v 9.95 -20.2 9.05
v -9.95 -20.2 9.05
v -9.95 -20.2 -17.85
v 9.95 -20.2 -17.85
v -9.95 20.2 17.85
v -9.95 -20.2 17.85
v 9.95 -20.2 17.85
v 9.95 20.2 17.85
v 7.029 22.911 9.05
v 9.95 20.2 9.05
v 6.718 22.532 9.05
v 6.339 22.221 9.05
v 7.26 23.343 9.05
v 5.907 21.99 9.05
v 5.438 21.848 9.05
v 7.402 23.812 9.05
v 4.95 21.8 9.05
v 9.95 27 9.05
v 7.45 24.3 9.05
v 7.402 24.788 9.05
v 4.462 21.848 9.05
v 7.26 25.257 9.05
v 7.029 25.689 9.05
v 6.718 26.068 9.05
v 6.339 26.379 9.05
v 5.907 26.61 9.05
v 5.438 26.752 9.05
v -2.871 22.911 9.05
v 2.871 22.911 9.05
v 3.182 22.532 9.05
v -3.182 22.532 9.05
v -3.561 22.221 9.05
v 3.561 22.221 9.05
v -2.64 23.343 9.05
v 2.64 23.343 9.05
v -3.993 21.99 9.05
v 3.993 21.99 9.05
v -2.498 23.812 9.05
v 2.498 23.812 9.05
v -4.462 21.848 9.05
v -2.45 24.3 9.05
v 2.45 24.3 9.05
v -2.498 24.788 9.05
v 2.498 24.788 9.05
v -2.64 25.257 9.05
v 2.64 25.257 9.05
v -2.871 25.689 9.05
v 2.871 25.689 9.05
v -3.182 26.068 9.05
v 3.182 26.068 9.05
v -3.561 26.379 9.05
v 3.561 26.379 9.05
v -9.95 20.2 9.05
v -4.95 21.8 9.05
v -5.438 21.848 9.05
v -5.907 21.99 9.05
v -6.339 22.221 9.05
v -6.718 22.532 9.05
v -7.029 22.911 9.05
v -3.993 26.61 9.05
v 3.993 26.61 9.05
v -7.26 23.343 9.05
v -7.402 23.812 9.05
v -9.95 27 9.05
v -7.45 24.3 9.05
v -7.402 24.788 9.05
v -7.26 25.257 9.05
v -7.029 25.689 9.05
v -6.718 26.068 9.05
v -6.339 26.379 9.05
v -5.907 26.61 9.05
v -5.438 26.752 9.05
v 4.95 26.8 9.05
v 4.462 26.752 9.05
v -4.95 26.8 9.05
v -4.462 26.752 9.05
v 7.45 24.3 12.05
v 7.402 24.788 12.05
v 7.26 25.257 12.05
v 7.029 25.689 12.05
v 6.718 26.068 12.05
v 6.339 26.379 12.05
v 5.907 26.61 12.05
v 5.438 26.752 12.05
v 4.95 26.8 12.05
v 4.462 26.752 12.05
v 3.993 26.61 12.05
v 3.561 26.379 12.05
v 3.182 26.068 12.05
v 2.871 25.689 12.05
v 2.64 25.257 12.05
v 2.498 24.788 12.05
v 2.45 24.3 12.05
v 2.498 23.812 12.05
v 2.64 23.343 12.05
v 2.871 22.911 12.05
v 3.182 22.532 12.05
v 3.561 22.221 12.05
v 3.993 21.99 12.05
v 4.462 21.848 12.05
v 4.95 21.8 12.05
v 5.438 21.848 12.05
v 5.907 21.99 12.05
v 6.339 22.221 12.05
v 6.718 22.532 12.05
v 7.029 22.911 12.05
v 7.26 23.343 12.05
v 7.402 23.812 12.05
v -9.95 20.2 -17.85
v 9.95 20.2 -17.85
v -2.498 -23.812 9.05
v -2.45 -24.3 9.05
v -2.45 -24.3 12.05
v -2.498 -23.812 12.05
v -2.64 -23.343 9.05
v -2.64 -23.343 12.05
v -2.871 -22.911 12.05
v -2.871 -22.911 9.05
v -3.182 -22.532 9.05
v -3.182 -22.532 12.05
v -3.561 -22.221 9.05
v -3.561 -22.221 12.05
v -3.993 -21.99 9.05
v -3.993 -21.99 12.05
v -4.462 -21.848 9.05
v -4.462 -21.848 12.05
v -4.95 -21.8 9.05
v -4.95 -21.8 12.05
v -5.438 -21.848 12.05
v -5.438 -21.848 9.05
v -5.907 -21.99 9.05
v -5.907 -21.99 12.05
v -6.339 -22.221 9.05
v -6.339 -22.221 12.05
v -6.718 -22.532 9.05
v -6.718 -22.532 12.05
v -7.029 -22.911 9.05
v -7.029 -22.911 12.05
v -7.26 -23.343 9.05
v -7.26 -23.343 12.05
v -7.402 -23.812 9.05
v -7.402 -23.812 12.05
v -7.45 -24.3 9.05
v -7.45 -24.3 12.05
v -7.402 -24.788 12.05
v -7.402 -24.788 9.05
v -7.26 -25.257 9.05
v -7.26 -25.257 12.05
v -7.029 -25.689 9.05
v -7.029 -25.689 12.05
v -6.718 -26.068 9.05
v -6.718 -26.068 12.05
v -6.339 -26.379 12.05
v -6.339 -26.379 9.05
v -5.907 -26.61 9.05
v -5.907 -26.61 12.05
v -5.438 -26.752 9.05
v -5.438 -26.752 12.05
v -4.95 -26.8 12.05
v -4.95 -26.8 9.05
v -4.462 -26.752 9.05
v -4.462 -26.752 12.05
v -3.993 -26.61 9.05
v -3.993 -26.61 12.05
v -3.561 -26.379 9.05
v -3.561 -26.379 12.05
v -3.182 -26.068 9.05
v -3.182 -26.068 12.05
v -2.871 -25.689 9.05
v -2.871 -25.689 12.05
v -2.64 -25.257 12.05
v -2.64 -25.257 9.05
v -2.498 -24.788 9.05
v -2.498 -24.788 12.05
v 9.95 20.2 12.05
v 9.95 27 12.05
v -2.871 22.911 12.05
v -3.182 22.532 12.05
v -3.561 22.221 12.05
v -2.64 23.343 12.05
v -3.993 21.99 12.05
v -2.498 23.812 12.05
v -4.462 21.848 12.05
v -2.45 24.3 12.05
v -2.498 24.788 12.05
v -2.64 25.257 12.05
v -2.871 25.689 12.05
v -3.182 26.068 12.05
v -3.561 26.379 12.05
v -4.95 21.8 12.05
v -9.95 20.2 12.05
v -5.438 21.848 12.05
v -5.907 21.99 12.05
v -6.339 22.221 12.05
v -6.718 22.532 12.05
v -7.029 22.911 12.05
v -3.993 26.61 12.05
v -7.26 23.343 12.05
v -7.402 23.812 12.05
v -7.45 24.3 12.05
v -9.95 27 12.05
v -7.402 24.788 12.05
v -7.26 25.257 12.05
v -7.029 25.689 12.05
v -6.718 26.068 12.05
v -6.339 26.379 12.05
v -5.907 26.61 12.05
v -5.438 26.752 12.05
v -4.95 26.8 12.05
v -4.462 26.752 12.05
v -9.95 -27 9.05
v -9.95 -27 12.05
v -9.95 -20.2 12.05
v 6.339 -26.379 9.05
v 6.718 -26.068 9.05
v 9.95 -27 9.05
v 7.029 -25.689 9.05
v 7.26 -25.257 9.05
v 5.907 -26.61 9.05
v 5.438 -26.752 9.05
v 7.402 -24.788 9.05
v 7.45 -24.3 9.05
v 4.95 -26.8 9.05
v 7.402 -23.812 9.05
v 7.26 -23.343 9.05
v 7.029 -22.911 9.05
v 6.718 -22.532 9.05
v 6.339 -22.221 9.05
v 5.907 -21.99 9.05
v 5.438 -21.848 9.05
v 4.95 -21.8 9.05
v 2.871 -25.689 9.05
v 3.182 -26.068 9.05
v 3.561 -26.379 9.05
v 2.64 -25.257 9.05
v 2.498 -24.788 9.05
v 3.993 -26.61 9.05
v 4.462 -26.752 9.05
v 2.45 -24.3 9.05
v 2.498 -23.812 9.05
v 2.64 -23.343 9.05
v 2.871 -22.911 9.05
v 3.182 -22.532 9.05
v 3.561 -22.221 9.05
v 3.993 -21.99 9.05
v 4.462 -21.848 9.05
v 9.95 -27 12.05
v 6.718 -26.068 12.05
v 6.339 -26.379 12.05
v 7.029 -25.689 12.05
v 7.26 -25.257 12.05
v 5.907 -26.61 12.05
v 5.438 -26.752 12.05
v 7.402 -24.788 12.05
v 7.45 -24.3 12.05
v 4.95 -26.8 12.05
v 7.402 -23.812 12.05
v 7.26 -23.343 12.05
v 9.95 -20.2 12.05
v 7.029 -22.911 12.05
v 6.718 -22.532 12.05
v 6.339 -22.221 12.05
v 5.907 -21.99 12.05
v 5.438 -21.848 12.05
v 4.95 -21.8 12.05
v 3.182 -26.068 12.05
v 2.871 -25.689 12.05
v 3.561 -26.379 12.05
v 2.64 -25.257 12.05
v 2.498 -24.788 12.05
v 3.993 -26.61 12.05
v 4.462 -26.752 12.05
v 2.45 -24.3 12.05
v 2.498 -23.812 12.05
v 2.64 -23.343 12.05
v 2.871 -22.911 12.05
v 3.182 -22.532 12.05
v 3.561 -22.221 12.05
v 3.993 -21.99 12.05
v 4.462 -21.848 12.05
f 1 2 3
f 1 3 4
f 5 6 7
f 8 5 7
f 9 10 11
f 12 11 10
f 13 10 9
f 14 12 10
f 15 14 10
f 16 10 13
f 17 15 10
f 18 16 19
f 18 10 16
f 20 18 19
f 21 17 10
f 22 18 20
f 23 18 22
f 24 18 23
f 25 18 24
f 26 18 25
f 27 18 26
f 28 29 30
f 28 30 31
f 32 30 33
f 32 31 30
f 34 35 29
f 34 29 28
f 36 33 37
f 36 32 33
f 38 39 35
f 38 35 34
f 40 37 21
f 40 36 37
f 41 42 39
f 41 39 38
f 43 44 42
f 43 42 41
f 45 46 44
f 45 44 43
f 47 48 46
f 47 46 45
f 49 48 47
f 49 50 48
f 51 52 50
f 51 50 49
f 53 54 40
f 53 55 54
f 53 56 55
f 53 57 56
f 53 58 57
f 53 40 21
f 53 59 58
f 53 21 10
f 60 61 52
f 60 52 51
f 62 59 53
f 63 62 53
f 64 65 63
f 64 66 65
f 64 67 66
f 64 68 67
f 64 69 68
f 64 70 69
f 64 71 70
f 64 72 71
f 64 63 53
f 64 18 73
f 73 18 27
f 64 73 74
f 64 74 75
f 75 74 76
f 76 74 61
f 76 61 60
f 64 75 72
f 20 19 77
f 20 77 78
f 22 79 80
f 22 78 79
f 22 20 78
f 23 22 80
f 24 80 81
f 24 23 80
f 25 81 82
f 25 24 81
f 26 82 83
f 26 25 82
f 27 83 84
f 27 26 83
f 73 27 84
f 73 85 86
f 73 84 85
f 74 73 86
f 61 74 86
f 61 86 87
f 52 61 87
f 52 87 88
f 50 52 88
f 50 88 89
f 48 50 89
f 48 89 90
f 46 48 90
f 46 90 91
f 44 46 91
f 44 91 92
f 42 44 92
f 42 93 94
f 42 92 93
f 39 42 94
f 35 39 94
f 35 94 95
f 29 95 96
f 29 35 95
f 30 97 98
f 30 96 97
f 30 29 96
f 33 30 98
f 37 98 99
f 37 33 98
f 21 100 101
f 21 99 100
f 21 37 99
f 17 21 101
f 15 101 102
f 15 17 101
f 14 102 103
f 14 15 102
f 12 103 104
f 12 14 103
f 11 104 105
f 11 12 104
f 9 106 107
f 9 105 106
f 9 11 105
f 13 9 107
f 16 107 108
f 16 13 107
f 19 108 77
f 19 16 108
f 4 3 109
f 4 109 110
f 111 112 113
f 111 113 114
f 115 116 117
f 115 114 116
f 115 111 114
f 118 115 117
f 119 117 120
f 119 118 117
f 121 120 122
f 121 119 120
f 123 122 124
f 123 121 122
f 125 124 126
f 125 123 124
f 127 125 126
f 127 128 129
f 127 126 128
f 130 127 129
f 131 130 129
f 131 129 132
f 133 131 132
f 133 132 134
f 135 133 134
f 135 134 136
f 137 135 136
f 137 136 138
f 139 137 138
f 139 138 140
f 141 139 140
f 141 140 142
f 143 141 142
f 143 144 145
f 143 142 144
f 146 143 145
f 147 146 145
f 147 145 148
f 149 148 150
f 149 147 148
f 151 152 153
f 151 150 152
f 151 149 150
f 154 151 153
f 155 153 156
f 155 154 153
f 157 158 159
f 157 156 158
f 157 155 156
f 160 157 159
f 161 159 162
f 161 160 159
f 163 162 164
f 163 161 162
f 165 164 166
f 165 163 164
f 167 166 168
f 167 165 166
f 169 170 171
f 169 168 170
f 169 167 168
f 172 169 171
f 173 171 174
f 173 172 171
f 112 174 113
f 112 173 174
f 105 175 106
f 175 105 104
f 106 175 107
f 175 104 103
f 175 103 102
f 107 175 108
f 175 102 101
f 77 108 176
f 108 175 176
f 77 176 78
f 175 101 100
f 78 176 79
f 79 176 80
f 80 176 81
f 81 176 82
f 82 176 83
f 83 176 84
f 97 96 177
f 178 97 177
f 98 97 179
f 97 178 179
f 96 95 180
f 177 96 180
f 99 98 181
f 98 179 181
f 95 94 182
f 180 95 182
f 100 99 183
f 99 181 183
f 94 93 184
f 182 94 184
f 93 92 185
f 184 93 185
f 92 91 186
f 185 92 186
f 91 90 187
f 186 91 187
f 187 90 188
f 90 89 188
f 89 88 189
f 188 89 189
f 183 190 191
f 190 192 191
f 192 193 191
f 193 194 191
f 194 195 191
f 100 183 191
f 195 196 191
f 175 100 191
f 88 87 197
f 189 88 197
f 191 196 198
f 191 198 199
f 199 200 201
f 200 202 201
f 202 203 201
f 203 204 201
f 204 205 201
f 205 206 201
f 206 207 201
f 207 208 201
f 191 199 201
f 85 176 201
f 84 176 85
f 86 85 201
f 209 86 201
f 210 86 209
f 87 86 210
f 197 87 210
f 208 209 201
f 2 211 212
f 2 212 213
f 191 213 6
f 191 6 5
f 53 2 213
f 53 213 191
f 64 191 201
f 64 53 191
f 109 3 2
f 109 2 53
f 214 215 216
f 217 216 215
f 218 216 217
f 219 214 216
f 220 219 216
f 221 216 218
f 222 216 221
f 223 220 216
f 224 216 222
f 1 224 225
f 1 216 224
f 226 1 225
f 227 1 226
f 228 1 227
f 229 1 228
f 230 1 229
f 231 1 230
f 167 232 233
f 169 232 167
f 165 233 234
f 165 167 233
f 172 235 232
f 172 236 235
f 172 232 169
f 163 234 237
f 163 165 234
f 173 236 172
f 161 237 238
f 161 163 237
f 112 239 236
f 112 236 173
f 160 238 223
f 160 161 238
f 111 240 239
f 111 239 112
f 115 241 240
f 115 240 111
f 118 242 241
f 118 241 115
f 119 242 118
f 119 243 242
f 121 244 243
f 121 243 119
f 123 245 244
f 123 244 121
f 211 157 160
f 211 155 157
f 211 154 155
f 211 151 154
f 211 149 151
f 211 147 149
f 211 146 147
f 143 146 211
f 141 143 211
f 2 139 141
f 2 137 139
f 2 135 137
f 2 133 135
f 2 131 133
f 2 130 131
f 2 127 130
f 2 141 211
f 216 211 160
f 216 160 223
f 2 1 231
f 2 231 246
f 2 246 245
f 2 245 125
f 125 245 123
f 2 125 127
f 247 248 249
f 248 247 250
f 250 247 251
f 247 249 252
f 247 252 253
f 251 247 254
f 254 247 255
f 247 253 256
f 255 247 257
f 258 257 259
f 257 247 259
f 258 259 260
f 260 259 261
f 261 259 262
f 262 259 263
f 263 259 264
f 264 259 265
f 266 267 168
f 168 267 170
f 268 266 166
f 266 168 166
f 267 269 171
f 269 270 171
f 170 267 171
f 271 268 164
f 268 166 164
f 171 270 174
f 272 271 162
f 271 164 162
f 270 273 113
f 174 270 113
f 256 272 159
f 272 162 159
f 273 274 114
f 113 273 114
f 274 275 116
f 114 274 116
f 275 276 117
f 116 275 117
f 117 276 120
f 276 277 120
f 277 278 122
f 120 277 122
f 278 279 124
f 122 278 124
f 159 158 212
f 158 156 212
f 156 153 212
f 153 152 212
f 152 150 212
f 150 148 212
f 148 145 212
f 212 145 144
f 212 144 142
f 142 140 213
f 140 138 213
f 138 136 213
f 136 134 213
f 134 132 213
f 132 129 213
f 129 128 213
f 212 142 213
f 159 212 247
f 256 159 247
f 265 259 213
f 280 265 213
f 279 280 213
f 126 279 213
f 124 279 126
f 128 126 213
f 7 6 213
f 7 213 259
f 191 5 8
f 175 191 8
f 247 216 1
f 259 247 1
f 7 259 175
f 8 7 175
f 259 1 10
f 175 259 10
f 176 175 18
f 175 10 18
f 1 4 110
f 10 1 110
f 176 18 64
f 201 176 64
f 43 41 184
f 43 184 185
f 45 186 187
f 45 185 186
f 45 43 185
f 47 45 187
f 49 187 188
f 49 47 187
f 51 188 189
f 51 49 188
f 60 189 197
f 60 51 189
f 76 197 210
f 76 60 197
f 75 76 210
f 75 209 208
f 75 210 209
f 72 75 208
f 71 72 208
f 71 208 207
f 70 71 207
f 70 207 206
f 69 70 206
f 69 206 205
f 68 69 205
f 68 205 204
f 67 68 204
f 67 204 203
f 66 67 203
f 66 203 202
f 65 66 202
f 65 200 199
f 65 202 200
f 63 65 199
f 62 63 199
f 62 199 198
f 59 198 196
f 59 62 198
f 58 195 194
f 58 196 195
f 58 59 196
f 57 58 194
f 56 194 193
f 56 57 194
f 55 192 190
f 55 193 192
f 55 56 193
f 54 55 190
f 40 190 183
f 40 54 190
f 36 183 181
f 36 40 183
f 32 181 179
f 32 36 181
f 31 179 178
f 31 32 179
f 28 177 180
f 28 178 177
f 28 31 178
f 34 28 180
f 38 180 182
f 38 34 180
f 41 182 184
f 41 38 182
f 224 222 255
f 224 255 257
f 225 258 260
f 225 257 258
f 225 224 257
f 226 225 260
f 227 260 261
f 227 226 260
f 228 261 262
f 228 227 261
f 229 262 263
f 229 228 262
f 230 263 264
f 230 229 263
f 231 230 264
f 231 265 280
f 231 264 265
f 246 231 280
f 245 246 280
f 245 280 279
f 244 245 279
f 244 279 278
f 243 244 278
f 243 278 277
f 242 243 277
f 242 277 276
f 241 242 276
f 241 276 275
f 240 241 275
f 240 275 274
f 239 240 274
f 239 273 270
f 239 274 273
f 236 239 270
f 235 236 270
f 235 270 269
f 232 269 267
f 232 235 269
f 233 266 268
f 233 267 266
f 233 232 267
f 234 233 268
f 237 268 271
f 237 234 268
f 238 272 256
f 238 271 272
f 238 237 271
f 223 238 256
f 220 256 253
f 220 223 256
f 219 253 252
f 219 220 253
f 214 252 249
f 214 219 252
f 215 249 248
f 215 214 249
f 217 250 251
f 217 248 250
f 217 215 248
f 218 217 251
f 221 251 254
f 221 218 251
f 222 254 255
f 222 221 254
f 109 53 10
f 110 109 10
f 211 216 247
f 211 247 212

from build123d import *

# Parameters (mm, degrees)
SKETCH4_W               = 19.9
SKETCH4_H               = 40.4
BOSS_EXTRUDE3_DEPTH     = 17.85
SKETCH6_W               = 19.9
SKETCH6_H               = 54
BOSS_EXTRUDE4_DEPTH     = 3
CUT_EXTRUDE2_DEPTH      = 34.861851692
CUT_EXTRUDE2_DEPTH_BACK = 34.861851692
SKETCH1_R               = 2.5


with BuildPart() as part:
    # Sketch4 → Boss-Extrude3 (new, symmetric)
    with BuildSketch(Plane.XY):
        Rectangle(SKETCH4_W, SKETCH4_H)
    extrude(amount=BOSS_EXTRUDE3_DEPTH, both=True)

    # Sketch6 → Boss-Extrude4 (add)
    with BuildSketch(Plane(origin=(0, 0, 9.05), x_dir=(-1, 0, 0), z_dir=(0, 0, -1))):
        Rectangle(SKETCH6_W, SKETCH6_H)
    extrude(amount=-BOSS_EXTRUDE4_DEPTH)

    # Sketch1 → Cut-Extrude2 (cut, two sides: drawn at the far end of the back side and taken through both)
    with BuildSketch(Plane.XY.offset(-CUT_EXTRUDE2_DEPTH_BACK)):
        with Locations((4.95, -24.3)):
            Circle(SKETCH1_R)
        with Locations((-4.95, -24.3)):
            Circle(SKETCH1_R)
        with Locations((-4.95, 24.3)):
            Circle(SKETCH1_R)
        with Locations((4.95, 24.3)):
            Circle(SKETCH1_R)
    extrude(amount=CUT_EXTRUDE2_DEPTH + CUT_EXTRUDE2_DEPTH_BACK, mode=Mode.SUBTRACT)


solid = part.part
